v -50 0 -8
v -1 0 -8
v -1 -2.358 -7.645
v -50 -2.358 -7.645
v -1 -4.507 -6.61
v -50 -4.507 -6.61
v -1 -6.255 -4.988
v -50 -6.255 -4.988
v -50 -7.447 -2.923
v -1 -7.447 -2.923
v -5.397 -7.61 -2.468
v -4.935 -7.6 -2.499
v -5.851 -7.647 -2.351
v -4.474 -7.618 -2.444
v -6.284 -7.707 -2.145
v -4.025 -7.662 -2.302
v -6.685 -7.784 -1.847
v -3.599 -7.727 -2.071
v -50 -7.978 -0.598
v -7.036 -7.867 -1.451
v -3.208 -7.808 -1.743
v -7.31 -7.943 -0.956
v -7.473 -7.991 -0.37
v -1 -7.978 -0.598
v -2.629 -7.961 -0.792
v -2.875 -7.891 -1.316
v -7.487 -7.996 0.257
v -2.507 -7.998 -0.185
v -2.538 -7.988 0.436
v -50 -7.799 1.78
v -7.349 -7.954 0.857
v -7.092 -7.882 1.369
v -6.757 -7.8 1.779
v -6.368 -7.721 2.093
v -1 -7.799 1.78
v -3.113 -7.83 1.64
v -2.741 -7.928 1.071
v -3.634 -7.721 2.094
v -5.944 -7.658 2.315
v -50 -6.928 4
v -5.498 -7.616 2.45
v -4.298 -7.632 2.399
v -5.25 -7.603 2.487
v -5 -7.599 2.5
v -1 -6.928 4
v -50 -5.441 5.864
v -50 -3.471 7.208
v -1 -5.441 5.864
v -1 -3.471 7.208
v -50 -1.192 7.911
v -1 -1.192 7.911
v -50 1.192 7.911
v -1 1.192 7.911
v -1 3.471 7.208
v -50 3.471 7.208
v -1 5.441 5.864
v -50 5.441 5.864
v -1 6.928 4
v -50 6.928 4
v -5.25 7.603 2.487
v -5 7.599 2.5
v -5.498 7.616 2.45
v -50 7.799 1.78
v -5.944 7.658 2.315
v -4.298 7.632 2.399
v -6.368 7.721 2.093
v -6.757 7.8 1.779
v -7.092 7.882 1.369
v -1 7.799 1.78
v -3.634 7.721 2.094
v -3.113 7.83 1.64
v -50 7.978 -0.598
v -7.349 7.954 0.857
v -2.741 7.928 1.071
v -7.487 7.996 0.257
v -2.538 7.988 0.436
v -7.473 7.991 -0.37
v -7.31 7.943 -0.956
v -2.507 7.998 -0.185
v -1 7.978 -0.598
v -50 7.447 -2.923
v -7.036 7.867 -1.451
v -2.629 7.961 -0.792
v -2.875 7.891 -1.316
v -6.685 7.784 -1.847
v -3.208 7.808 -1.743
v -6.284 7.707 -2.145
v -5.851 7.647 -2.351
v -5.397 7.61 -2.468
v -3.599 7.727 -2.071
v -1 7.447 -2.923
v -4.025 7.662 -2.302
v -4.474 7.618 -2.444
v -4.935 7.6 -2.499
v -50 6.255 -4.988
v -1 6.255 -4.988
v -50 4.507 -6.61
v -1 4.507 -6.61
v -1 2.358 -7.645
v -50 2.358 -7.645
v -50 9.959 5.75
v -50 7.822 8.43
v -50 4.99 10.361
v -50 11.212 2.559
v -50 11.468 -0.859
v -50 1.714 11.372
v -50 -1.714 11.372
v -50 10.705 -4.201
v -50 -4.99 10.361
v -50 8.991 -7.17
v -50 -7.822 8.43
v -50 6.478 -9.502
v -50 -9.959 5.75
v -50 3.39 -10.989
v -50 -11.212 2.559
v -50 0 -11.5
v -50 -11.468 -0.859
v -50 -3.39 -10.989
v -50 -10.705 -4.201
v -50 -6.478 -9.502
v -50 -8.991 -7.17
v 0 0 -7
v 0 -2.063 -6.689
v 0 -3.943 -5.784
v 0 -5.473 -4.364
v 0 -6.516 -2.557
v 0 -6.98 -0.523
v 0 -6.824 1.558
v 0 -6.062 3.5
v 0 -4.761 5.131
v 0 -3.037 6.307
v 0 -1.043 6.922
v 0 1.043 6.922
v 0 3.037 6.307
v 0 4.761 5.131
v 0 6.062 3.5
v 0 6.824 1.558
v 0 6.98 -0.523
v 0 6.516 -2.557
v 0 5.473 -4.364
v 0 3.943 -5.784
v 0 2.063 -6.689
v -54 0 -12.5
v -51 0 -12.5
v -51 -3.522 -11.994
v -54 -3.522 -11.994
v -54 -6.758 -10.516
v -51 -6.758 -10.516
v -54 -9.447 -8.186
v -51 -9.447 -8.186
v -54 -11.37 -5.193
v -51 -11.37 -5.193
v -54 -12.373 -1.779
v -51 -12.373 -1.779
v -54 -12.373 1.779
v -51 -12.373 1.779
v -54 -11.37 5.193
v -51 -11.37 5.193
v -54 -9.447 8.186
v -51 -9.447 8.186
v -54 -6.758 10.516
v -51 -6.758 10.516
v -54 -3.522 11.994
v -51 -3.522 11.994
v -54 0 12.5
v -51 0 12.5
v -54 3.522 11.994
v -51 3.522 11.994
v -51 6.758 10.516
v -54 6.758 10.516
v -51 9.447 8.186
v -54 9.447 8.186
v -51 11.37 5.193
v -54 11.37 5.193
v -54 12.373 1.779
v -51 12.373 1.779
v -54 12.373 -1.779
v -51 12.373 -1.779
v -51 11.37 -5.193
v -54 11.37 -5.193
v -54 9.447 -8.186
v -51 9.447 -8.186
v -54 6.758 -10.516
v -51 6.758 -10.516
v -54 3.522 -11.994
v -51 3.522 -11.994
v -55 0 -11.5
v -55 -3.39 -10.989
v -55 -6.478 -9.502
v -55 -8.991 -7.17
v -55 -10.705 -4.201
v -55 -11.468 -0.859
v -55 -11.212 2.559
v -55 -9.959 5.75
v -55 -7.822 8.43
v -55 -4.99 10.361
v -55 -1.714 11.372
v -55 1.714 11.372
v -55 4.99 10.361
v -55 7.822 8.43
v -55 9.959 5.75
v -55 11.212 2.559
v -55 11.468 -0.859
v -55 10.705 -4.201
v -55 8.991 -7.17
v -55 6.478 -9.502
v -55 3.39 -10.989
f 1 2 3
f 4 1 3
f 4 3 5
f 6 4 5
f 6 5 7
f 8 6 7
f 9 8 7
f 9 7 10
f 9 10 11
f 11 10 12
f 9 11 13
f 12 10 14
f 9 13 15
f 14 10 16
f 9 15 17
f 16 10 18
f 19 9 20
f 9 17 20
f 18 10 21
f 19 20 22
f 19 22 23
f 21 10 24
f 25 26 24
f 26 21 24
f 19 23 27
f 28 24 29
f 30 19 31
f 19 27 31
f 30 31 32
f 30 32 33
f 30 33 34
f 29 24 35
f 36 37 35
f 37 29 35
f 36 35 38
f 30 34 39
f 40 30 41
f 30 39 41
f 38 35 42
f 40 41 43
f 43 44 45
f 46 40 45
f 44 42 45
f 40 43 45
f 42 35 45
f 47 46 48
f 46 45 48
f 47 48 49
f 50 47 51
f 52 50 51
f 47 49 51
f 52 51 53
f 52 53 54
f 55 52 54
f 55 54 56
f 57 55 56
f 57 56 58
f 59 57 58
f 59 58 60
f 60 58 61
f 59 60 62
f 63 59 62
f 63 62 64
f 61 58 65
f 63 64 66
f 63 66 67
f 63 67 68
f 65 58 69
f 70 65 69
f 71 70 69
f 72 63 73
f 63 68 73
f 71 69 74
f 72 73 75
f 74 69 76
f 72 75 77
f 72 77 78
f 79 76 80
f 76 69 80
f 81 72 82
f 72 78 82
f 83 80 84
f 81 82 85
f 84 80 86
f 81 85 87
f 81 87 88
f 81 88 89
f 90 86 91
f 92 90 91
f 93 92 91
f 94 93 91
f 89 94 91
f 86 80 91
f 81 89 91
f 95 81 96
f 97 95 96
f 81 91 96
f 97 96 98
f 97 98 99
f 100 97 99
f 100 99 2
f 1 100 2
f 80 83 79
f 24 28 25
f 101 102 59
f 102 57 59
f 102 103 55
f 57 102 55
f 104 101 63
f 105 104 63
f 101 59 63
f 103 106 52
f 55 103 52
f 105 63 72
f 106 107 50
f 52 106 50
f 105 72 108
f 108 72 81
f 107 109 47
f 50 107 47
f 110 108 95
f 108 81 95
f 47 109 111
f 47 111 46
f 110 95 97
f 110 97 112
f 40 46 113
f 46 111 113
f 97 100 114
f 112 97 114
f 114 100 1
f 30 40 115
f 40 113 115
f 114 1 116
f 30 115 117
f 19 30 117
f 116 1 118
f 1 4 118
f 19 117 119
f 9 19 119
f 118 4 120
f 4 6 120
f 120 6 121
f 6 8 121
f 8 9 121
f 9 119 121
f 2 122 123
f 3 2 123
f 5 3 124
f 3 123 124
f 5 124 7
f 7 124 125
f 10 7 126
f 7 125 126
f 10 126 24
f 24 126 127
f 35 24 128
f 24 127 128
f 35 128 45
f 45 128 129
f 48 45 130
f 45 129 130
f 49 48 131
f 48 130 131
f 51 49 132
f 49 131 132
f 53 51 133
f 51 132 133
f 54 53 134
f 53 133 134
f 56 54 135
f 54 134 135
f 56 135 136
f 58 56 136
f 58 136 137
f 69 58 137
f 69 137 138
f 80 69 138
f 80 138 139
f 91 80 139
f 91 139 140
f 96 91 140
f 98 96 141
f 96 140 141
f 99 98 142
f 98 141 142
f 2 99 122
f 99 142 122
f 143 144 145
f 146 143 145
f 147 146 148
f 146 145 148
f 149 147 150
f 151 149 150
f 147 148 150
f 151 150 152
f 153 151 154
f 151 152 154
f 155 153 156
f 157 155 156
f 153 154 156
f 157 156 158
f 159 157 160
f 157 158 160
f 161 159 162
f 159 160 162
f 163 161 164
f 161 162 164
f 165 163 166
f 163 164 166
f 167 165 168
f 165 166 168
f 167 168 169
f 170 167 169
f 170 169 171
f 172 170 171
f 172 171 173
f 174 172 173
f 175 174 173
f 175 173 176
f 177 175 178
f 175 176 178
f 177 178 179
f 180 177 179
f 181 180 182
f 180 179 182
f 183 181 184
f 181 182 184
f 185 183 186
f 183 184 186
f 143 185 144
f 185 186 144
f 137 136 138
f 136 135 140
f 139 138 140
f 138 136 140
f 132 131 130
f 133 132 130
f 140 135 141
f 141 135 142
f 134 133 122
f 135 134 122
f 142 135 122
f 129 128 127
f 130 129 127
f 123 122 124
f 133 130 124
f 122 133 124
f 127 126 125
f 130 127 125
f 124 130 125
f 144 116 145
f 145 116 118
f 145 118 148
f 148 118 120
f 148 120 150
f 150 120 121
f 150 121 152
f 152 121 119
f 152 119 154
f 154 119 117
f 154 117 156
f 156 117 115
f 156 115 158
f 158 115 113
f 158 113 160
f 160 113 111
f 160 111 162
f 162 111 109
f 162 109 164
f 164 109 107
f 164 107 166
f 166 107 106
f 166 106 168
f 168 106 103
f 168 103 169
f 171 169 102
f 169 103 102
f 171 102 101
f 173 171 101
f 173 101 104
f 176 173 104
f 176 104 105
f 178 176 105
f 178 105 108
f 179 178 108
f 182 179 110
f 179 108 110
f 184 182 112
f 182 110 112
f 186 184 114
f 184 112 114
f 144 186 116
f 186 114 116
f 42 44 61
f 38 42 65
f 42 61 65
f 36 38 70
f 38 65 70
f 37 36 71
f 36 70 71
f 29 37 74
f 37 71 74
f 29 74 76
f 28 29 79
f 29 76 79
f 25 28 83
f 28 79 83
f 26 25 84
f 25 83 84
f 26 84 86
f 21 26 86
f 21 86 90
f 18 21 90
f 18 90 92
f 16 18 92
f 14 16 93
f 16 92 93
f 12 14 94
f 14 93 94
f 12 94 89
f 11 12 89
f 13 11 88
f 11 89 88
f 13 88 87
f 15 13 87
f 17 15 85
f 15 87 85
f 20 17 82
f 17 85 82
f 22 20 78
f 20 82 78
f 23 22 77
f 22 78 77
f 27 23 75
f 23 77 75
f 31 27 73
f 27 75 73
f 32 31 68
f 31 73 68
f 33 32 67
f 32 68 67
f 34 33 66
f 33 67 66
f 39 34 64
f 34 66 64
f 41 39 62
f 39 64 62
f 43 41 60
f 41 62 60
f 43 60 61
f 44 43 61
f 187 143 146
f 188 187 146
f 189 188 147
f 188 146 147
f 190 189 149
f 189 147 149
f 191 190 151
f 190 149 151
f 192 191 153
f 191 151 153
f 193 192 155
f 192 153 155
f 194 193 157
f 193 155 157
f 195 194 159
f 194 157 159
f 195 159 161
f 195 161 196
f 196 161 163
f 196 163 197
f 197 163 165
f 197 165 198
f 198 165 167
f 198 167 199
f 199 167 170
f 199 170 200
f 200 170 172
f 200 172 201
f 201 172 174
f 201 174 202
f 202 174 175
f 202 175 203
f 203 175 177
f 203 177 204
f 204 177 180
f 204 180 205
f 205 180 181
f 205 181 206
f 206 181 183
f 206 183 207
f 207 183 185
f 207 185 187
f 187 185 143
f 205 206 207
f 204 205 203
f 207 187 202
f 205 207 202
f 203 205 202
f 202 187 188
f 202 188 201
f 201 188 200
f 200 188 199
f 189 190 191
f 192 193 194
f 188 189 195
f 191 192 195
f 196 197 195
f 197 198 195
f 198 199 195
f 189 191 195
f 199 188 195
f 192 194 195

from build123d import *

# Parameters (mm, degrees)
CHAMFER_1_SIZE      = 1
CHAMFER_2_SIZE      = 1
SKETCH_2_R          = 2.5
CUT_EXTRUDE_1_DEPTH = 40


with BuildPart() as part:
    # 草图1 → 旋转1 (revolve)
    with BuildSketch(Plane.XY, mode=Mode.PRIVATE) as revolve_1_sk:
        Polygon((-55, 0), (-55, 12.5), (-50, 12.5), (-50, 8), (0, 8), (0, 0), align=None)
    revolve(revolve_1_sk.sketch.rotate(Axis((0, 0, 0), (-1, 0, 0)), 90), axis=Axis((0, 0, 0), (-1, 0, 0)))

    # 倒角1
    chamfer_1_edges = [part.edges().sort_by_distance(p)[0] for p in [
        (-50, 0, 12.5),
        (-55, 0, 12.5),
    ]]
    chamfer(chamfer_1_edges, length=CHAMFER_1_SIZE)

    # 倒角2
    chamfer_2_edges = [part.edges().sort_by_distance(p)[0] for p in [
        (0, 0, 8),
    ]]
    chamfer(chamfer_2_edges, length=CHAMFER_2_SIZE)

    # 草图2 → 切除-拉伸1 (cut, symmetric)
    with BuildSketch(Plane(origin=(0, 0, 0), x_dir=(1, 0, 0), z_dir=(0, 1, 0))):
        with Locations(Location((-5, 0, 0), (0, 0, 270))):
            Circle(SKETCH_2_R)
    extrude(amount=CUT_EXTRUDE_1_DEPTH, both=True, mode=Mode.SUBTRACT)


solid = part.part
